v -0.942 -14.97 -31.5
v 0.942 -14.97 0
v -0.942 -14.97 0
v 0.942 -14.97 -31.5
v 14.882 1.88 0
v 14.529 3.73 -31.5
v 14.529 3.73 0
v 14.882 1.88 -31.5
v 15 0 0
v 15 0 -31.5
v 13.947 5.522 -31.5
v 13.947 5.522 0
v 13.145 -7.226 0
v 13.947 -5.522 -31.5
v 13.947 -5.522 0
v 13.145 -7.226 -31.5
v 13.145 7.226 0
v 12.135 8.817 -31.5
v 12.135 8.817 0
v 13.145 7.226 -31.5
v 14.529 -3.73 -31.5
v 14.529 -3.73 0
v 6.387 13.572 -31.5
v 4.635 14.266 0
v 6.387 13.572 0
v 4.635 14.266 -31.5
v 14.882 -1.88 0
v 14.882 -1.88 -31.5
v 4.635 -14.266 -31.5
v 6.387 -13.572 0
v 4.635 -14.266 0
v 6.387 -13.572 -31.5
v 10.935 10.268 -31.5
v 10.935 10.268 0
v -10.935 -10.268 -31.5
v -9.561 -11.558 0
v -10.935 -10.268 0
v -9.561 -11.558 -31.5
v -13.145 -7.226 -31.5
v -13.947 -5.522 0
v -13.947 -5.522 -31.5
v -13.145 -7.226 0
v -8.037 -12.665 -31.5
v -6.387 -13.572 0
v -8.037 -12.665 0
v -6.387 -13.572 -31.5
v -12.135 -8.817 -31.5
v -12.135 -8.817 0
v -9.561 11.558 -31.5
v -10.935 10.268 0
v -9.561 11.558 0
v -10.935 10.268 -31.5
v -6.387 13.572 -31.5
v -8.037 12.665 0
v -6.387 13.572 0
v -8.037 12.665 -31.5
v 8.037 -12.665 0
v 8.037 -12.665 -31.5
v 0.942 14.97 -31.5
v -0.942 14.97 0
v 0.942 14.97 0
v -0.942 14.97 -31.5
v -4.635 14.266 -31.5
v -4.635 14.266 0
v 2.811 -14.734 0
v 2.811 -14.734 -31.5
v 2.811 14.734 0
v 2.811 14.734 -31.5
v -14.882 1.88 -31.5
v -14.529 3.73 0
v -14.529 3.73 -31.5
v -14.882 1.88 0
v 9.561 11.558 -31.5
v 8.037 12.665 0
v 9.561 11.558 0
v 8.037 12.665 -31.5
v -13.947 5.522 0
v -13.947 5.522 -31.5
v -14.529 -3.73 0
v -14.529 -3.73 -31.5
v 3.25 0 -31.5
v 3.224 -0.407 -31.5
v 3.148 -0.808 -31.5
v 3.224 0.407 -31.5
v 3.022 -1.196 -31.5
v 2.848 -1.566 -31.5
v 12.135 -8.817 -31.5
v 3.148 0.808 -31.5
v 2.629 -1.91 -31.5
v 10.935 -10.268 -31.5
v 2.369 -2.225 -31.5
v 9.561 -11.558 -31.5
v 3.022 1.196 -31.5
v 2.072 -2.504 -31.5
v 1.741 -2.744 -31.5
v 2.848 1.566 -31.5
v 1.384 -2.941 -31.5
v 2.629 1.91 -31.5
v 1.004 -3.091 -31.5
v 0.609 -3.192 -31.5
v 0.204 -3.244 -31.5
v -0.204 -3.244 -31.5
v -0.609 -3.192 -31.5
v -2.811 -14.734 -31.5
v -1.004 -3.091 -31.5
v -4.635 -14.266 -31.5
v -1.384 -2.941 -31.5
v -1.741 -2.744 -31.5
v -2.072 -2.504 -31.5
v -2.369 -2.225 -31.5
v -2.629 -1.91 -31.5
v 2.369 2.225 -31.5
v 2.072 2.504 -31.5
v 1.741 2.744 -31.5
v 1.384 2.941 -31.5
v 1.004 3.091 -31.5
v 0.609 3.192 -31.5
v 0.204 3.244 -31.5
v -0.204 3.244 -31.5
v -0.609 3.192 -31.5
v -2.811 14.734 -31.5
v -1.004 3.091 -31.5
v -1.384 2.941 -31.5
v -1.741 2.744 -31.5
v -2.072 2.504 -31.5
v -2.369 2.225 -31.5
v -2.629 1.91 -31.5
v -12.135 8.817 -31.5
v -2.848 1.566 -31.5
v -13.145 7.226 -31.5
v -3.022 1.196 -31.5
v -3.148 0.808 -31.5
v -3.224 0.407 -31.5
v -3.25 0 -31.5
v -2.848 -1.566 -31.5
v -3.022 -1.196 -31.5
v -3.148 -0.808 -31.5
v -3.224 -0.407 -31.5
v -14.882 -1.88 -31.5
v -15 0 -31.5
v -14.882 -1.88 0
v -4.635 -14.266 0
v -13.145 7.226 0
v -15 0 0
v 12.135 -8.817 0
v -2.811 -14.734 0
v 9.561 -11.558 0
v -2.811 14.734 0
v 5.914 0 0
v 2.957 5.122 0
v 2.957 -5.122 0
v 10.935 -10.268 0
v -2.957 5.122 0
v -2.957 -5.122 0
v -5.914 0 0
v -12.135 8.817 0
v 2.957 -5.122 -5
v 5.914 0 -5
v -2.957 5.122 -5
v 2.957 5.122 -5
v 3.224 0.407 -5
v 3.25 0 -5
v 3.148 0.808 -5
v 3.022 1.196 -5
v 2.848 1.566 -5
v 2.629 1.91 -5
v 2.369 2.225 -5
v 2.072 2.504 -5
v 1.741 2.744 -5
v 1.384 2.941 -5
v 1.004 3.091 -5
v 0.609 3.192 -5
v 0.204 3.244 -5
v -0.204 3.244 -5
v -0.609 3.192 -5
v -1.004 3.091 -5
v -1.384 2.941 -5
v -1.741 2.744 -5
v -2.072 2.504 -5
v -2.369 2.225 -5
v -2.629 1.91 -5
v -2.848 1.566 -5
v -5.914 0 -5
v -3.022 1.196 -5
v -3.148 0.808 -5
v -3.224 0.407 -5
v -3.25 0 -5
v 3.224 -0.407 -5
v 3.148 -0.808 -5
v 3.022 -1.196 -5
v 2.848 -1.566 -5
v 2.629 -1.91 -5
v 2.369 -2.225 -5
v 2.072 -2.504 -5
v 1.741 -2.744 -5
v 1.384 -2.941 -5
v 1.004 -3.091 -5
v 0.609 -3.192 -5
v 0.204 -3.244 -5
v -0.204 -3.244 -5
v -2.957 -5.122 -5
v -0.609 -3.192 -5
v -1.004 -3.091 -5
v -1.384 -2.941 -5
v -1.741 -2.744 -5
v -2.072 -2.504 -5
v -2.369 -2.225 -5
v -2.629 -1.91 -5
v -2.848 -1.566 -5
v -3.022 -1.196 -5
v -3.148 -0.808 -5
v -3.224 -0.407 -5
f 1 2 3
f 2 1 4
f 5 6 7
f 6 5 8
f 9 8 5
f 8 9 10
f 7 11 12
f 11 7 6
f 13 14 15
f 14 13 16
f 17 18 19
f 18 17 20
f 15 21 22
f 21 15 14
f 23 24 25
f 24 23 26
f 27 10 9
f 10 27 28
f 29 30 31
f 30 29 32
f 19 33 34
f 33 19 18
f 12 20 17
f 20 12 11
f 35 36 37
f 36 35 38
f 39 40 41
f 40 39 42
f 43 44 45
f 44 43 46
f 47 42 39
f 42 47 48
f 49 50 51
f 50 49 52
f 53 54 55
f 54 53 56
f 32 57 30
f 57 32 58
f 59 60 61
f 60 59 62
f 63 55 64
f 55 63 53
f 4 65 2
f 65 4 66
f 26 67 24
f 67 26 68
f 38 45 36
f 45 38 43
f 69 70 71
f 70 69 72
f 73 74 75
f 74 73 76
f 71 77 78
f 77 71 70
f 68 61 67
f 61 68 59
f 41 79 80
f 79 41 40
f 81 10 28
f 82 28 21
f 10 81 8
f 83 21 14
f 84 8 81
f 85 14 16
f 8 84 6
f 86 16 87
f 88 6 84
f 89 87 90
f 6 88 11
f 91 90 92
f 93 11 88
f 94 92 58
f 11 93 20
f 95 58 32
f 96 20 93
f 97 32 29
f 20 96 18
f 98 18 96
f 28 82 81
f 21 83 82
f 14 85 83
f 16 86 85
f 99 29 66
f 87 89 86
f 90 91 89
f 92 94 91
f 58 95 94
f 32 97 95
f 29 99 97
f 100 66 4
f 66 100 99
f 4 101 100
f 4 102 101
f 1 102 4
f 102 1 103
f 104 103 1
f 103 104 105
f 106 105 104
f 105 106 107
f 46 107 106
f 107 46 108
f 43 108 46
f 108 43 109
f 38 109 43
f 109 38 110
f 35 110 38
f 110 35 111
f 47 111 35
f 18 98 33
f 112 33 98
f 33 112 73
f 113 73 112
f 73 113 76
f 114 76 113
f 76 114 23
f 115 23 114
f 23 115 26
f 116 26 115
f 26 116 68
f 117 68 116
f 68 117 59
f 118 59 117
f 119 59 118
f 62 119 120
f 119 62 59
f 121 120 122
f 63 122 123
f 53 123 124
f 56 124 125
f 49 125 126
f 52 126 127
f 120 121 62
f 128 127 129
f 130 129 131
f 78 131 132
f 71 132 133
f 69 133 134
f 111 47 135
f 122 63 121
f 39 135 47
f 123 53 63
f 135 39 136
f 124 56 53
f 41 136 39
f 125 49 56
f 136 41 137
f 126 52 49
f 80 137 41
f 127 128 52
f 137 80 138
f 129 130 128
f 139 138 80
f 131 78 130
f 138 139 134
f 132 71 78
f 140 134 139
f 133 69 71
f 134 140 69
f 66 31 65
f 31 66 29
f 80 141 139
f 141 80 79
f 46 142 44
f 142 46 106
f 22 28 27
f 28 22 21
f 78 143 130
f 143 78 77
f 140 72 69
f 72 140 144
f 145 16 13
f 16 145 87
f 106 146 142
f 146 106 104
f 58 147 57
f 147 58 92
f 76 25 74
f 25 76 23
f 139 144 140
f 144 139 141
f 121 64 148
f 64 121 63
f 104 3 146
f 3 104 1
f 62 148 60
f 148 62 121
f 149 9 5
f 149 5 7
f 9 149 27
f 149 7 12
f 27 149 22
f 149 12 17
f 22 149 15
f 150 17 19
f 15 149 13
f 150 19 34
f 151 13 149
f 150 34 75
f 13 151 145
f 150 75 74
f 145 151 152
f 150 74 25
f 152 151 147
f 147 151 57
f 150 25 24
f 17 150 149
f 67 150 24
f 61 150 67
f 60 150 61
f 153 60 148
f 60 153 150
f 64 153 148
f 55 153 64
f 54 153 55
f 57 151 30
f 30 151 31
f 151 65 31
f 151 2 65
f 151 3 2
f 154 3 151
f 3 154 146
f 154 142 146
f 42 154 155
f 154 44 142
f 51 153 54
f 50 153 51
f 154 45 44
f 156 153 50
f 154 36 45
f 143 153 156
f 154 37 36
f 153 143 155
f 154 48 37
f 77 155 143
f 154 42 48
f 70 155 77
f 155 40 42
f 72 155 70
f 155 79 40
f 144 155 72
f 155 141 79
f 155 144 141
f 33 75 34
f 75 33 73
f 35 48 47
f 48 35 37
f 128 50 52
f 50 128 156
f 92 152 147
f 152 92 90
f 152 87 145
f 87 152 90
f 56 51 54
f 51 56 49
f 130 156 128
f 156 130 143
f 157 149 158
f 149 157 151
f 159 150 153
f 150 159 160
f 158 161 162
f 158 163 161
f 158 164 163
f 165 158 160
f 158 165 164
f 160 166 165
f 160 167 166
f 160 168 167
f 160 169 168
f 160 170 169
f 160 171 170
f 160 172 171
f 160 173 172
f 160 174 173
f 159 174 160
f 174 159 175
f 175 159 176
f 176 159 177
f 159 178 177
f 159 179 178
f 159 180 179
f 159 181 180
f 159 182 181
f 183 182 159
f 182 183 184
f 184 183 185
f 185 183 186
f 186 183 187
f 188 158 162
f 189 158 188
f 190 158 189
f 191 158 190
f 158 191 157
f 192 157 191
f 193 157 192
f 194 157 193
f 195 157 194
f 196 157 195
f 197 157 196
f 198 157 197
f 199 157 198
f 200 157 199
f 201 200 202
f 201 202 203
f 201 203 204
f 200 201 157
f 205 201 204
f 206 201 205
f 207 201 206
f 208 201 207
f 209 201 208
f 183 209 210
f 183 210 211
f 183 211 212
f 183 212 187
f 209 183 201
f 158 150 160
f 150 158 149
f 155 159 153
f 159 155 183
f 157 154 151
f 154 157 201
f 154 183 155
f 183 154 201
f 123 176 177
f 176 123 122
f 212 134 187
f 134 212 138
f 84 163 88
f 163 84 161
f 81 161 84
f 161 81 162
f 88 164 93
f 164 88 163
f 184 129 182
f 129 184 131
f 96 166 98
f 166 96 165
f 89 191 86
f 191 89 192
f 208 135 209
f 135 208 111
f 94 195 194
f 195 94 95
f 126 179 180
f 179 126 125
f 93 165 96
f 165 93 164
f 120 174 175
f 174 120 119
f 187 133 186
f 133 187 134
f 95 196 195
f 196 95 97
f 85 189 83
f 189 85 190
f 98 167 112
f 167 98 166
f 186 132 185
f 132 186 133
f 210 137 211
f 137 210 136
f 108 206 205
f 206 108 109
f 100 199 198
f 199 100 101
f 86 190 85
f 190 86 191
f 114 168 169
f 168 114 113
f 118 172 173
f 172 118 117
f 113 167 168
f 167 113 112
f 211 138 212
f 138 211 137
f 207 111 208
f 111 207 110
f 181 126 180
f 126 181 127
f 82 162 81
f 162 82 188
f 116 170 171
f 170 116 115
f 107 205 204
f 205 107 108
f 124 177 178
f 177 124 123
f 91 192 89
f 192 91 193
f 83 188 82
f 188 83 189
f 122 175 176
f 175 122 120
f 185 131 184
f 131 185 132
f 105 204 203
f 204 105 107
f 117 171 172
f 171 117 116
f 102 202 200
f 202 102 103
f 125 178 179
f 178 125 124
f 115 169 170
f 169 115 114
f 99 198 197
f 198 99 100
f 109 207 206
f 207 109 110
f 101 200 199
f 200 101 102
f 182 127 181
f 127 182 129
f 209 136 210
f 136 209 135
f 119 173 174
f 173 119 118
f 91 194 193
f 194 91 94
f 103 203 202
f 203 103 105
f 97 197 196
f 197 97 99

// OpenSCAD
$fn = 50;


difference() {
	union() {
		translate(v = [0, 0, -31.5000000000]) {
			cylinder(h = 31.5000000000, r = 15.0000000000);
		}
		#translate(v = [0, 0, -33.0000000000]) {
			cylinder(h = 33, r = 2.8750000000);
		}
	}
	union() {
		translate(v = [0, 0, 0]) {
			rotate(a = [0, 0, 0]) {
				difference() {
					union() {
						translate(v = [0, 0, -5]) {
							linear_extrude(height = 5) {
								polygon(points = [[5.9142500000, 0.0000000000], [2.9571250000, 5.1218907443], [-2.9571250000, 5.1218907443], [-5.9142500000, 0.0000000000], [-2.9571250000, -5.1218907443], [2.9571250000, -5.1218907443]]);
							}
						}
					}
					union();
				}
			}
		}
		#translate(v = [0, 0, -100.0000000000]) {
			cylinder(h = 200, r = 3.2500000000);
		}
	}
}
